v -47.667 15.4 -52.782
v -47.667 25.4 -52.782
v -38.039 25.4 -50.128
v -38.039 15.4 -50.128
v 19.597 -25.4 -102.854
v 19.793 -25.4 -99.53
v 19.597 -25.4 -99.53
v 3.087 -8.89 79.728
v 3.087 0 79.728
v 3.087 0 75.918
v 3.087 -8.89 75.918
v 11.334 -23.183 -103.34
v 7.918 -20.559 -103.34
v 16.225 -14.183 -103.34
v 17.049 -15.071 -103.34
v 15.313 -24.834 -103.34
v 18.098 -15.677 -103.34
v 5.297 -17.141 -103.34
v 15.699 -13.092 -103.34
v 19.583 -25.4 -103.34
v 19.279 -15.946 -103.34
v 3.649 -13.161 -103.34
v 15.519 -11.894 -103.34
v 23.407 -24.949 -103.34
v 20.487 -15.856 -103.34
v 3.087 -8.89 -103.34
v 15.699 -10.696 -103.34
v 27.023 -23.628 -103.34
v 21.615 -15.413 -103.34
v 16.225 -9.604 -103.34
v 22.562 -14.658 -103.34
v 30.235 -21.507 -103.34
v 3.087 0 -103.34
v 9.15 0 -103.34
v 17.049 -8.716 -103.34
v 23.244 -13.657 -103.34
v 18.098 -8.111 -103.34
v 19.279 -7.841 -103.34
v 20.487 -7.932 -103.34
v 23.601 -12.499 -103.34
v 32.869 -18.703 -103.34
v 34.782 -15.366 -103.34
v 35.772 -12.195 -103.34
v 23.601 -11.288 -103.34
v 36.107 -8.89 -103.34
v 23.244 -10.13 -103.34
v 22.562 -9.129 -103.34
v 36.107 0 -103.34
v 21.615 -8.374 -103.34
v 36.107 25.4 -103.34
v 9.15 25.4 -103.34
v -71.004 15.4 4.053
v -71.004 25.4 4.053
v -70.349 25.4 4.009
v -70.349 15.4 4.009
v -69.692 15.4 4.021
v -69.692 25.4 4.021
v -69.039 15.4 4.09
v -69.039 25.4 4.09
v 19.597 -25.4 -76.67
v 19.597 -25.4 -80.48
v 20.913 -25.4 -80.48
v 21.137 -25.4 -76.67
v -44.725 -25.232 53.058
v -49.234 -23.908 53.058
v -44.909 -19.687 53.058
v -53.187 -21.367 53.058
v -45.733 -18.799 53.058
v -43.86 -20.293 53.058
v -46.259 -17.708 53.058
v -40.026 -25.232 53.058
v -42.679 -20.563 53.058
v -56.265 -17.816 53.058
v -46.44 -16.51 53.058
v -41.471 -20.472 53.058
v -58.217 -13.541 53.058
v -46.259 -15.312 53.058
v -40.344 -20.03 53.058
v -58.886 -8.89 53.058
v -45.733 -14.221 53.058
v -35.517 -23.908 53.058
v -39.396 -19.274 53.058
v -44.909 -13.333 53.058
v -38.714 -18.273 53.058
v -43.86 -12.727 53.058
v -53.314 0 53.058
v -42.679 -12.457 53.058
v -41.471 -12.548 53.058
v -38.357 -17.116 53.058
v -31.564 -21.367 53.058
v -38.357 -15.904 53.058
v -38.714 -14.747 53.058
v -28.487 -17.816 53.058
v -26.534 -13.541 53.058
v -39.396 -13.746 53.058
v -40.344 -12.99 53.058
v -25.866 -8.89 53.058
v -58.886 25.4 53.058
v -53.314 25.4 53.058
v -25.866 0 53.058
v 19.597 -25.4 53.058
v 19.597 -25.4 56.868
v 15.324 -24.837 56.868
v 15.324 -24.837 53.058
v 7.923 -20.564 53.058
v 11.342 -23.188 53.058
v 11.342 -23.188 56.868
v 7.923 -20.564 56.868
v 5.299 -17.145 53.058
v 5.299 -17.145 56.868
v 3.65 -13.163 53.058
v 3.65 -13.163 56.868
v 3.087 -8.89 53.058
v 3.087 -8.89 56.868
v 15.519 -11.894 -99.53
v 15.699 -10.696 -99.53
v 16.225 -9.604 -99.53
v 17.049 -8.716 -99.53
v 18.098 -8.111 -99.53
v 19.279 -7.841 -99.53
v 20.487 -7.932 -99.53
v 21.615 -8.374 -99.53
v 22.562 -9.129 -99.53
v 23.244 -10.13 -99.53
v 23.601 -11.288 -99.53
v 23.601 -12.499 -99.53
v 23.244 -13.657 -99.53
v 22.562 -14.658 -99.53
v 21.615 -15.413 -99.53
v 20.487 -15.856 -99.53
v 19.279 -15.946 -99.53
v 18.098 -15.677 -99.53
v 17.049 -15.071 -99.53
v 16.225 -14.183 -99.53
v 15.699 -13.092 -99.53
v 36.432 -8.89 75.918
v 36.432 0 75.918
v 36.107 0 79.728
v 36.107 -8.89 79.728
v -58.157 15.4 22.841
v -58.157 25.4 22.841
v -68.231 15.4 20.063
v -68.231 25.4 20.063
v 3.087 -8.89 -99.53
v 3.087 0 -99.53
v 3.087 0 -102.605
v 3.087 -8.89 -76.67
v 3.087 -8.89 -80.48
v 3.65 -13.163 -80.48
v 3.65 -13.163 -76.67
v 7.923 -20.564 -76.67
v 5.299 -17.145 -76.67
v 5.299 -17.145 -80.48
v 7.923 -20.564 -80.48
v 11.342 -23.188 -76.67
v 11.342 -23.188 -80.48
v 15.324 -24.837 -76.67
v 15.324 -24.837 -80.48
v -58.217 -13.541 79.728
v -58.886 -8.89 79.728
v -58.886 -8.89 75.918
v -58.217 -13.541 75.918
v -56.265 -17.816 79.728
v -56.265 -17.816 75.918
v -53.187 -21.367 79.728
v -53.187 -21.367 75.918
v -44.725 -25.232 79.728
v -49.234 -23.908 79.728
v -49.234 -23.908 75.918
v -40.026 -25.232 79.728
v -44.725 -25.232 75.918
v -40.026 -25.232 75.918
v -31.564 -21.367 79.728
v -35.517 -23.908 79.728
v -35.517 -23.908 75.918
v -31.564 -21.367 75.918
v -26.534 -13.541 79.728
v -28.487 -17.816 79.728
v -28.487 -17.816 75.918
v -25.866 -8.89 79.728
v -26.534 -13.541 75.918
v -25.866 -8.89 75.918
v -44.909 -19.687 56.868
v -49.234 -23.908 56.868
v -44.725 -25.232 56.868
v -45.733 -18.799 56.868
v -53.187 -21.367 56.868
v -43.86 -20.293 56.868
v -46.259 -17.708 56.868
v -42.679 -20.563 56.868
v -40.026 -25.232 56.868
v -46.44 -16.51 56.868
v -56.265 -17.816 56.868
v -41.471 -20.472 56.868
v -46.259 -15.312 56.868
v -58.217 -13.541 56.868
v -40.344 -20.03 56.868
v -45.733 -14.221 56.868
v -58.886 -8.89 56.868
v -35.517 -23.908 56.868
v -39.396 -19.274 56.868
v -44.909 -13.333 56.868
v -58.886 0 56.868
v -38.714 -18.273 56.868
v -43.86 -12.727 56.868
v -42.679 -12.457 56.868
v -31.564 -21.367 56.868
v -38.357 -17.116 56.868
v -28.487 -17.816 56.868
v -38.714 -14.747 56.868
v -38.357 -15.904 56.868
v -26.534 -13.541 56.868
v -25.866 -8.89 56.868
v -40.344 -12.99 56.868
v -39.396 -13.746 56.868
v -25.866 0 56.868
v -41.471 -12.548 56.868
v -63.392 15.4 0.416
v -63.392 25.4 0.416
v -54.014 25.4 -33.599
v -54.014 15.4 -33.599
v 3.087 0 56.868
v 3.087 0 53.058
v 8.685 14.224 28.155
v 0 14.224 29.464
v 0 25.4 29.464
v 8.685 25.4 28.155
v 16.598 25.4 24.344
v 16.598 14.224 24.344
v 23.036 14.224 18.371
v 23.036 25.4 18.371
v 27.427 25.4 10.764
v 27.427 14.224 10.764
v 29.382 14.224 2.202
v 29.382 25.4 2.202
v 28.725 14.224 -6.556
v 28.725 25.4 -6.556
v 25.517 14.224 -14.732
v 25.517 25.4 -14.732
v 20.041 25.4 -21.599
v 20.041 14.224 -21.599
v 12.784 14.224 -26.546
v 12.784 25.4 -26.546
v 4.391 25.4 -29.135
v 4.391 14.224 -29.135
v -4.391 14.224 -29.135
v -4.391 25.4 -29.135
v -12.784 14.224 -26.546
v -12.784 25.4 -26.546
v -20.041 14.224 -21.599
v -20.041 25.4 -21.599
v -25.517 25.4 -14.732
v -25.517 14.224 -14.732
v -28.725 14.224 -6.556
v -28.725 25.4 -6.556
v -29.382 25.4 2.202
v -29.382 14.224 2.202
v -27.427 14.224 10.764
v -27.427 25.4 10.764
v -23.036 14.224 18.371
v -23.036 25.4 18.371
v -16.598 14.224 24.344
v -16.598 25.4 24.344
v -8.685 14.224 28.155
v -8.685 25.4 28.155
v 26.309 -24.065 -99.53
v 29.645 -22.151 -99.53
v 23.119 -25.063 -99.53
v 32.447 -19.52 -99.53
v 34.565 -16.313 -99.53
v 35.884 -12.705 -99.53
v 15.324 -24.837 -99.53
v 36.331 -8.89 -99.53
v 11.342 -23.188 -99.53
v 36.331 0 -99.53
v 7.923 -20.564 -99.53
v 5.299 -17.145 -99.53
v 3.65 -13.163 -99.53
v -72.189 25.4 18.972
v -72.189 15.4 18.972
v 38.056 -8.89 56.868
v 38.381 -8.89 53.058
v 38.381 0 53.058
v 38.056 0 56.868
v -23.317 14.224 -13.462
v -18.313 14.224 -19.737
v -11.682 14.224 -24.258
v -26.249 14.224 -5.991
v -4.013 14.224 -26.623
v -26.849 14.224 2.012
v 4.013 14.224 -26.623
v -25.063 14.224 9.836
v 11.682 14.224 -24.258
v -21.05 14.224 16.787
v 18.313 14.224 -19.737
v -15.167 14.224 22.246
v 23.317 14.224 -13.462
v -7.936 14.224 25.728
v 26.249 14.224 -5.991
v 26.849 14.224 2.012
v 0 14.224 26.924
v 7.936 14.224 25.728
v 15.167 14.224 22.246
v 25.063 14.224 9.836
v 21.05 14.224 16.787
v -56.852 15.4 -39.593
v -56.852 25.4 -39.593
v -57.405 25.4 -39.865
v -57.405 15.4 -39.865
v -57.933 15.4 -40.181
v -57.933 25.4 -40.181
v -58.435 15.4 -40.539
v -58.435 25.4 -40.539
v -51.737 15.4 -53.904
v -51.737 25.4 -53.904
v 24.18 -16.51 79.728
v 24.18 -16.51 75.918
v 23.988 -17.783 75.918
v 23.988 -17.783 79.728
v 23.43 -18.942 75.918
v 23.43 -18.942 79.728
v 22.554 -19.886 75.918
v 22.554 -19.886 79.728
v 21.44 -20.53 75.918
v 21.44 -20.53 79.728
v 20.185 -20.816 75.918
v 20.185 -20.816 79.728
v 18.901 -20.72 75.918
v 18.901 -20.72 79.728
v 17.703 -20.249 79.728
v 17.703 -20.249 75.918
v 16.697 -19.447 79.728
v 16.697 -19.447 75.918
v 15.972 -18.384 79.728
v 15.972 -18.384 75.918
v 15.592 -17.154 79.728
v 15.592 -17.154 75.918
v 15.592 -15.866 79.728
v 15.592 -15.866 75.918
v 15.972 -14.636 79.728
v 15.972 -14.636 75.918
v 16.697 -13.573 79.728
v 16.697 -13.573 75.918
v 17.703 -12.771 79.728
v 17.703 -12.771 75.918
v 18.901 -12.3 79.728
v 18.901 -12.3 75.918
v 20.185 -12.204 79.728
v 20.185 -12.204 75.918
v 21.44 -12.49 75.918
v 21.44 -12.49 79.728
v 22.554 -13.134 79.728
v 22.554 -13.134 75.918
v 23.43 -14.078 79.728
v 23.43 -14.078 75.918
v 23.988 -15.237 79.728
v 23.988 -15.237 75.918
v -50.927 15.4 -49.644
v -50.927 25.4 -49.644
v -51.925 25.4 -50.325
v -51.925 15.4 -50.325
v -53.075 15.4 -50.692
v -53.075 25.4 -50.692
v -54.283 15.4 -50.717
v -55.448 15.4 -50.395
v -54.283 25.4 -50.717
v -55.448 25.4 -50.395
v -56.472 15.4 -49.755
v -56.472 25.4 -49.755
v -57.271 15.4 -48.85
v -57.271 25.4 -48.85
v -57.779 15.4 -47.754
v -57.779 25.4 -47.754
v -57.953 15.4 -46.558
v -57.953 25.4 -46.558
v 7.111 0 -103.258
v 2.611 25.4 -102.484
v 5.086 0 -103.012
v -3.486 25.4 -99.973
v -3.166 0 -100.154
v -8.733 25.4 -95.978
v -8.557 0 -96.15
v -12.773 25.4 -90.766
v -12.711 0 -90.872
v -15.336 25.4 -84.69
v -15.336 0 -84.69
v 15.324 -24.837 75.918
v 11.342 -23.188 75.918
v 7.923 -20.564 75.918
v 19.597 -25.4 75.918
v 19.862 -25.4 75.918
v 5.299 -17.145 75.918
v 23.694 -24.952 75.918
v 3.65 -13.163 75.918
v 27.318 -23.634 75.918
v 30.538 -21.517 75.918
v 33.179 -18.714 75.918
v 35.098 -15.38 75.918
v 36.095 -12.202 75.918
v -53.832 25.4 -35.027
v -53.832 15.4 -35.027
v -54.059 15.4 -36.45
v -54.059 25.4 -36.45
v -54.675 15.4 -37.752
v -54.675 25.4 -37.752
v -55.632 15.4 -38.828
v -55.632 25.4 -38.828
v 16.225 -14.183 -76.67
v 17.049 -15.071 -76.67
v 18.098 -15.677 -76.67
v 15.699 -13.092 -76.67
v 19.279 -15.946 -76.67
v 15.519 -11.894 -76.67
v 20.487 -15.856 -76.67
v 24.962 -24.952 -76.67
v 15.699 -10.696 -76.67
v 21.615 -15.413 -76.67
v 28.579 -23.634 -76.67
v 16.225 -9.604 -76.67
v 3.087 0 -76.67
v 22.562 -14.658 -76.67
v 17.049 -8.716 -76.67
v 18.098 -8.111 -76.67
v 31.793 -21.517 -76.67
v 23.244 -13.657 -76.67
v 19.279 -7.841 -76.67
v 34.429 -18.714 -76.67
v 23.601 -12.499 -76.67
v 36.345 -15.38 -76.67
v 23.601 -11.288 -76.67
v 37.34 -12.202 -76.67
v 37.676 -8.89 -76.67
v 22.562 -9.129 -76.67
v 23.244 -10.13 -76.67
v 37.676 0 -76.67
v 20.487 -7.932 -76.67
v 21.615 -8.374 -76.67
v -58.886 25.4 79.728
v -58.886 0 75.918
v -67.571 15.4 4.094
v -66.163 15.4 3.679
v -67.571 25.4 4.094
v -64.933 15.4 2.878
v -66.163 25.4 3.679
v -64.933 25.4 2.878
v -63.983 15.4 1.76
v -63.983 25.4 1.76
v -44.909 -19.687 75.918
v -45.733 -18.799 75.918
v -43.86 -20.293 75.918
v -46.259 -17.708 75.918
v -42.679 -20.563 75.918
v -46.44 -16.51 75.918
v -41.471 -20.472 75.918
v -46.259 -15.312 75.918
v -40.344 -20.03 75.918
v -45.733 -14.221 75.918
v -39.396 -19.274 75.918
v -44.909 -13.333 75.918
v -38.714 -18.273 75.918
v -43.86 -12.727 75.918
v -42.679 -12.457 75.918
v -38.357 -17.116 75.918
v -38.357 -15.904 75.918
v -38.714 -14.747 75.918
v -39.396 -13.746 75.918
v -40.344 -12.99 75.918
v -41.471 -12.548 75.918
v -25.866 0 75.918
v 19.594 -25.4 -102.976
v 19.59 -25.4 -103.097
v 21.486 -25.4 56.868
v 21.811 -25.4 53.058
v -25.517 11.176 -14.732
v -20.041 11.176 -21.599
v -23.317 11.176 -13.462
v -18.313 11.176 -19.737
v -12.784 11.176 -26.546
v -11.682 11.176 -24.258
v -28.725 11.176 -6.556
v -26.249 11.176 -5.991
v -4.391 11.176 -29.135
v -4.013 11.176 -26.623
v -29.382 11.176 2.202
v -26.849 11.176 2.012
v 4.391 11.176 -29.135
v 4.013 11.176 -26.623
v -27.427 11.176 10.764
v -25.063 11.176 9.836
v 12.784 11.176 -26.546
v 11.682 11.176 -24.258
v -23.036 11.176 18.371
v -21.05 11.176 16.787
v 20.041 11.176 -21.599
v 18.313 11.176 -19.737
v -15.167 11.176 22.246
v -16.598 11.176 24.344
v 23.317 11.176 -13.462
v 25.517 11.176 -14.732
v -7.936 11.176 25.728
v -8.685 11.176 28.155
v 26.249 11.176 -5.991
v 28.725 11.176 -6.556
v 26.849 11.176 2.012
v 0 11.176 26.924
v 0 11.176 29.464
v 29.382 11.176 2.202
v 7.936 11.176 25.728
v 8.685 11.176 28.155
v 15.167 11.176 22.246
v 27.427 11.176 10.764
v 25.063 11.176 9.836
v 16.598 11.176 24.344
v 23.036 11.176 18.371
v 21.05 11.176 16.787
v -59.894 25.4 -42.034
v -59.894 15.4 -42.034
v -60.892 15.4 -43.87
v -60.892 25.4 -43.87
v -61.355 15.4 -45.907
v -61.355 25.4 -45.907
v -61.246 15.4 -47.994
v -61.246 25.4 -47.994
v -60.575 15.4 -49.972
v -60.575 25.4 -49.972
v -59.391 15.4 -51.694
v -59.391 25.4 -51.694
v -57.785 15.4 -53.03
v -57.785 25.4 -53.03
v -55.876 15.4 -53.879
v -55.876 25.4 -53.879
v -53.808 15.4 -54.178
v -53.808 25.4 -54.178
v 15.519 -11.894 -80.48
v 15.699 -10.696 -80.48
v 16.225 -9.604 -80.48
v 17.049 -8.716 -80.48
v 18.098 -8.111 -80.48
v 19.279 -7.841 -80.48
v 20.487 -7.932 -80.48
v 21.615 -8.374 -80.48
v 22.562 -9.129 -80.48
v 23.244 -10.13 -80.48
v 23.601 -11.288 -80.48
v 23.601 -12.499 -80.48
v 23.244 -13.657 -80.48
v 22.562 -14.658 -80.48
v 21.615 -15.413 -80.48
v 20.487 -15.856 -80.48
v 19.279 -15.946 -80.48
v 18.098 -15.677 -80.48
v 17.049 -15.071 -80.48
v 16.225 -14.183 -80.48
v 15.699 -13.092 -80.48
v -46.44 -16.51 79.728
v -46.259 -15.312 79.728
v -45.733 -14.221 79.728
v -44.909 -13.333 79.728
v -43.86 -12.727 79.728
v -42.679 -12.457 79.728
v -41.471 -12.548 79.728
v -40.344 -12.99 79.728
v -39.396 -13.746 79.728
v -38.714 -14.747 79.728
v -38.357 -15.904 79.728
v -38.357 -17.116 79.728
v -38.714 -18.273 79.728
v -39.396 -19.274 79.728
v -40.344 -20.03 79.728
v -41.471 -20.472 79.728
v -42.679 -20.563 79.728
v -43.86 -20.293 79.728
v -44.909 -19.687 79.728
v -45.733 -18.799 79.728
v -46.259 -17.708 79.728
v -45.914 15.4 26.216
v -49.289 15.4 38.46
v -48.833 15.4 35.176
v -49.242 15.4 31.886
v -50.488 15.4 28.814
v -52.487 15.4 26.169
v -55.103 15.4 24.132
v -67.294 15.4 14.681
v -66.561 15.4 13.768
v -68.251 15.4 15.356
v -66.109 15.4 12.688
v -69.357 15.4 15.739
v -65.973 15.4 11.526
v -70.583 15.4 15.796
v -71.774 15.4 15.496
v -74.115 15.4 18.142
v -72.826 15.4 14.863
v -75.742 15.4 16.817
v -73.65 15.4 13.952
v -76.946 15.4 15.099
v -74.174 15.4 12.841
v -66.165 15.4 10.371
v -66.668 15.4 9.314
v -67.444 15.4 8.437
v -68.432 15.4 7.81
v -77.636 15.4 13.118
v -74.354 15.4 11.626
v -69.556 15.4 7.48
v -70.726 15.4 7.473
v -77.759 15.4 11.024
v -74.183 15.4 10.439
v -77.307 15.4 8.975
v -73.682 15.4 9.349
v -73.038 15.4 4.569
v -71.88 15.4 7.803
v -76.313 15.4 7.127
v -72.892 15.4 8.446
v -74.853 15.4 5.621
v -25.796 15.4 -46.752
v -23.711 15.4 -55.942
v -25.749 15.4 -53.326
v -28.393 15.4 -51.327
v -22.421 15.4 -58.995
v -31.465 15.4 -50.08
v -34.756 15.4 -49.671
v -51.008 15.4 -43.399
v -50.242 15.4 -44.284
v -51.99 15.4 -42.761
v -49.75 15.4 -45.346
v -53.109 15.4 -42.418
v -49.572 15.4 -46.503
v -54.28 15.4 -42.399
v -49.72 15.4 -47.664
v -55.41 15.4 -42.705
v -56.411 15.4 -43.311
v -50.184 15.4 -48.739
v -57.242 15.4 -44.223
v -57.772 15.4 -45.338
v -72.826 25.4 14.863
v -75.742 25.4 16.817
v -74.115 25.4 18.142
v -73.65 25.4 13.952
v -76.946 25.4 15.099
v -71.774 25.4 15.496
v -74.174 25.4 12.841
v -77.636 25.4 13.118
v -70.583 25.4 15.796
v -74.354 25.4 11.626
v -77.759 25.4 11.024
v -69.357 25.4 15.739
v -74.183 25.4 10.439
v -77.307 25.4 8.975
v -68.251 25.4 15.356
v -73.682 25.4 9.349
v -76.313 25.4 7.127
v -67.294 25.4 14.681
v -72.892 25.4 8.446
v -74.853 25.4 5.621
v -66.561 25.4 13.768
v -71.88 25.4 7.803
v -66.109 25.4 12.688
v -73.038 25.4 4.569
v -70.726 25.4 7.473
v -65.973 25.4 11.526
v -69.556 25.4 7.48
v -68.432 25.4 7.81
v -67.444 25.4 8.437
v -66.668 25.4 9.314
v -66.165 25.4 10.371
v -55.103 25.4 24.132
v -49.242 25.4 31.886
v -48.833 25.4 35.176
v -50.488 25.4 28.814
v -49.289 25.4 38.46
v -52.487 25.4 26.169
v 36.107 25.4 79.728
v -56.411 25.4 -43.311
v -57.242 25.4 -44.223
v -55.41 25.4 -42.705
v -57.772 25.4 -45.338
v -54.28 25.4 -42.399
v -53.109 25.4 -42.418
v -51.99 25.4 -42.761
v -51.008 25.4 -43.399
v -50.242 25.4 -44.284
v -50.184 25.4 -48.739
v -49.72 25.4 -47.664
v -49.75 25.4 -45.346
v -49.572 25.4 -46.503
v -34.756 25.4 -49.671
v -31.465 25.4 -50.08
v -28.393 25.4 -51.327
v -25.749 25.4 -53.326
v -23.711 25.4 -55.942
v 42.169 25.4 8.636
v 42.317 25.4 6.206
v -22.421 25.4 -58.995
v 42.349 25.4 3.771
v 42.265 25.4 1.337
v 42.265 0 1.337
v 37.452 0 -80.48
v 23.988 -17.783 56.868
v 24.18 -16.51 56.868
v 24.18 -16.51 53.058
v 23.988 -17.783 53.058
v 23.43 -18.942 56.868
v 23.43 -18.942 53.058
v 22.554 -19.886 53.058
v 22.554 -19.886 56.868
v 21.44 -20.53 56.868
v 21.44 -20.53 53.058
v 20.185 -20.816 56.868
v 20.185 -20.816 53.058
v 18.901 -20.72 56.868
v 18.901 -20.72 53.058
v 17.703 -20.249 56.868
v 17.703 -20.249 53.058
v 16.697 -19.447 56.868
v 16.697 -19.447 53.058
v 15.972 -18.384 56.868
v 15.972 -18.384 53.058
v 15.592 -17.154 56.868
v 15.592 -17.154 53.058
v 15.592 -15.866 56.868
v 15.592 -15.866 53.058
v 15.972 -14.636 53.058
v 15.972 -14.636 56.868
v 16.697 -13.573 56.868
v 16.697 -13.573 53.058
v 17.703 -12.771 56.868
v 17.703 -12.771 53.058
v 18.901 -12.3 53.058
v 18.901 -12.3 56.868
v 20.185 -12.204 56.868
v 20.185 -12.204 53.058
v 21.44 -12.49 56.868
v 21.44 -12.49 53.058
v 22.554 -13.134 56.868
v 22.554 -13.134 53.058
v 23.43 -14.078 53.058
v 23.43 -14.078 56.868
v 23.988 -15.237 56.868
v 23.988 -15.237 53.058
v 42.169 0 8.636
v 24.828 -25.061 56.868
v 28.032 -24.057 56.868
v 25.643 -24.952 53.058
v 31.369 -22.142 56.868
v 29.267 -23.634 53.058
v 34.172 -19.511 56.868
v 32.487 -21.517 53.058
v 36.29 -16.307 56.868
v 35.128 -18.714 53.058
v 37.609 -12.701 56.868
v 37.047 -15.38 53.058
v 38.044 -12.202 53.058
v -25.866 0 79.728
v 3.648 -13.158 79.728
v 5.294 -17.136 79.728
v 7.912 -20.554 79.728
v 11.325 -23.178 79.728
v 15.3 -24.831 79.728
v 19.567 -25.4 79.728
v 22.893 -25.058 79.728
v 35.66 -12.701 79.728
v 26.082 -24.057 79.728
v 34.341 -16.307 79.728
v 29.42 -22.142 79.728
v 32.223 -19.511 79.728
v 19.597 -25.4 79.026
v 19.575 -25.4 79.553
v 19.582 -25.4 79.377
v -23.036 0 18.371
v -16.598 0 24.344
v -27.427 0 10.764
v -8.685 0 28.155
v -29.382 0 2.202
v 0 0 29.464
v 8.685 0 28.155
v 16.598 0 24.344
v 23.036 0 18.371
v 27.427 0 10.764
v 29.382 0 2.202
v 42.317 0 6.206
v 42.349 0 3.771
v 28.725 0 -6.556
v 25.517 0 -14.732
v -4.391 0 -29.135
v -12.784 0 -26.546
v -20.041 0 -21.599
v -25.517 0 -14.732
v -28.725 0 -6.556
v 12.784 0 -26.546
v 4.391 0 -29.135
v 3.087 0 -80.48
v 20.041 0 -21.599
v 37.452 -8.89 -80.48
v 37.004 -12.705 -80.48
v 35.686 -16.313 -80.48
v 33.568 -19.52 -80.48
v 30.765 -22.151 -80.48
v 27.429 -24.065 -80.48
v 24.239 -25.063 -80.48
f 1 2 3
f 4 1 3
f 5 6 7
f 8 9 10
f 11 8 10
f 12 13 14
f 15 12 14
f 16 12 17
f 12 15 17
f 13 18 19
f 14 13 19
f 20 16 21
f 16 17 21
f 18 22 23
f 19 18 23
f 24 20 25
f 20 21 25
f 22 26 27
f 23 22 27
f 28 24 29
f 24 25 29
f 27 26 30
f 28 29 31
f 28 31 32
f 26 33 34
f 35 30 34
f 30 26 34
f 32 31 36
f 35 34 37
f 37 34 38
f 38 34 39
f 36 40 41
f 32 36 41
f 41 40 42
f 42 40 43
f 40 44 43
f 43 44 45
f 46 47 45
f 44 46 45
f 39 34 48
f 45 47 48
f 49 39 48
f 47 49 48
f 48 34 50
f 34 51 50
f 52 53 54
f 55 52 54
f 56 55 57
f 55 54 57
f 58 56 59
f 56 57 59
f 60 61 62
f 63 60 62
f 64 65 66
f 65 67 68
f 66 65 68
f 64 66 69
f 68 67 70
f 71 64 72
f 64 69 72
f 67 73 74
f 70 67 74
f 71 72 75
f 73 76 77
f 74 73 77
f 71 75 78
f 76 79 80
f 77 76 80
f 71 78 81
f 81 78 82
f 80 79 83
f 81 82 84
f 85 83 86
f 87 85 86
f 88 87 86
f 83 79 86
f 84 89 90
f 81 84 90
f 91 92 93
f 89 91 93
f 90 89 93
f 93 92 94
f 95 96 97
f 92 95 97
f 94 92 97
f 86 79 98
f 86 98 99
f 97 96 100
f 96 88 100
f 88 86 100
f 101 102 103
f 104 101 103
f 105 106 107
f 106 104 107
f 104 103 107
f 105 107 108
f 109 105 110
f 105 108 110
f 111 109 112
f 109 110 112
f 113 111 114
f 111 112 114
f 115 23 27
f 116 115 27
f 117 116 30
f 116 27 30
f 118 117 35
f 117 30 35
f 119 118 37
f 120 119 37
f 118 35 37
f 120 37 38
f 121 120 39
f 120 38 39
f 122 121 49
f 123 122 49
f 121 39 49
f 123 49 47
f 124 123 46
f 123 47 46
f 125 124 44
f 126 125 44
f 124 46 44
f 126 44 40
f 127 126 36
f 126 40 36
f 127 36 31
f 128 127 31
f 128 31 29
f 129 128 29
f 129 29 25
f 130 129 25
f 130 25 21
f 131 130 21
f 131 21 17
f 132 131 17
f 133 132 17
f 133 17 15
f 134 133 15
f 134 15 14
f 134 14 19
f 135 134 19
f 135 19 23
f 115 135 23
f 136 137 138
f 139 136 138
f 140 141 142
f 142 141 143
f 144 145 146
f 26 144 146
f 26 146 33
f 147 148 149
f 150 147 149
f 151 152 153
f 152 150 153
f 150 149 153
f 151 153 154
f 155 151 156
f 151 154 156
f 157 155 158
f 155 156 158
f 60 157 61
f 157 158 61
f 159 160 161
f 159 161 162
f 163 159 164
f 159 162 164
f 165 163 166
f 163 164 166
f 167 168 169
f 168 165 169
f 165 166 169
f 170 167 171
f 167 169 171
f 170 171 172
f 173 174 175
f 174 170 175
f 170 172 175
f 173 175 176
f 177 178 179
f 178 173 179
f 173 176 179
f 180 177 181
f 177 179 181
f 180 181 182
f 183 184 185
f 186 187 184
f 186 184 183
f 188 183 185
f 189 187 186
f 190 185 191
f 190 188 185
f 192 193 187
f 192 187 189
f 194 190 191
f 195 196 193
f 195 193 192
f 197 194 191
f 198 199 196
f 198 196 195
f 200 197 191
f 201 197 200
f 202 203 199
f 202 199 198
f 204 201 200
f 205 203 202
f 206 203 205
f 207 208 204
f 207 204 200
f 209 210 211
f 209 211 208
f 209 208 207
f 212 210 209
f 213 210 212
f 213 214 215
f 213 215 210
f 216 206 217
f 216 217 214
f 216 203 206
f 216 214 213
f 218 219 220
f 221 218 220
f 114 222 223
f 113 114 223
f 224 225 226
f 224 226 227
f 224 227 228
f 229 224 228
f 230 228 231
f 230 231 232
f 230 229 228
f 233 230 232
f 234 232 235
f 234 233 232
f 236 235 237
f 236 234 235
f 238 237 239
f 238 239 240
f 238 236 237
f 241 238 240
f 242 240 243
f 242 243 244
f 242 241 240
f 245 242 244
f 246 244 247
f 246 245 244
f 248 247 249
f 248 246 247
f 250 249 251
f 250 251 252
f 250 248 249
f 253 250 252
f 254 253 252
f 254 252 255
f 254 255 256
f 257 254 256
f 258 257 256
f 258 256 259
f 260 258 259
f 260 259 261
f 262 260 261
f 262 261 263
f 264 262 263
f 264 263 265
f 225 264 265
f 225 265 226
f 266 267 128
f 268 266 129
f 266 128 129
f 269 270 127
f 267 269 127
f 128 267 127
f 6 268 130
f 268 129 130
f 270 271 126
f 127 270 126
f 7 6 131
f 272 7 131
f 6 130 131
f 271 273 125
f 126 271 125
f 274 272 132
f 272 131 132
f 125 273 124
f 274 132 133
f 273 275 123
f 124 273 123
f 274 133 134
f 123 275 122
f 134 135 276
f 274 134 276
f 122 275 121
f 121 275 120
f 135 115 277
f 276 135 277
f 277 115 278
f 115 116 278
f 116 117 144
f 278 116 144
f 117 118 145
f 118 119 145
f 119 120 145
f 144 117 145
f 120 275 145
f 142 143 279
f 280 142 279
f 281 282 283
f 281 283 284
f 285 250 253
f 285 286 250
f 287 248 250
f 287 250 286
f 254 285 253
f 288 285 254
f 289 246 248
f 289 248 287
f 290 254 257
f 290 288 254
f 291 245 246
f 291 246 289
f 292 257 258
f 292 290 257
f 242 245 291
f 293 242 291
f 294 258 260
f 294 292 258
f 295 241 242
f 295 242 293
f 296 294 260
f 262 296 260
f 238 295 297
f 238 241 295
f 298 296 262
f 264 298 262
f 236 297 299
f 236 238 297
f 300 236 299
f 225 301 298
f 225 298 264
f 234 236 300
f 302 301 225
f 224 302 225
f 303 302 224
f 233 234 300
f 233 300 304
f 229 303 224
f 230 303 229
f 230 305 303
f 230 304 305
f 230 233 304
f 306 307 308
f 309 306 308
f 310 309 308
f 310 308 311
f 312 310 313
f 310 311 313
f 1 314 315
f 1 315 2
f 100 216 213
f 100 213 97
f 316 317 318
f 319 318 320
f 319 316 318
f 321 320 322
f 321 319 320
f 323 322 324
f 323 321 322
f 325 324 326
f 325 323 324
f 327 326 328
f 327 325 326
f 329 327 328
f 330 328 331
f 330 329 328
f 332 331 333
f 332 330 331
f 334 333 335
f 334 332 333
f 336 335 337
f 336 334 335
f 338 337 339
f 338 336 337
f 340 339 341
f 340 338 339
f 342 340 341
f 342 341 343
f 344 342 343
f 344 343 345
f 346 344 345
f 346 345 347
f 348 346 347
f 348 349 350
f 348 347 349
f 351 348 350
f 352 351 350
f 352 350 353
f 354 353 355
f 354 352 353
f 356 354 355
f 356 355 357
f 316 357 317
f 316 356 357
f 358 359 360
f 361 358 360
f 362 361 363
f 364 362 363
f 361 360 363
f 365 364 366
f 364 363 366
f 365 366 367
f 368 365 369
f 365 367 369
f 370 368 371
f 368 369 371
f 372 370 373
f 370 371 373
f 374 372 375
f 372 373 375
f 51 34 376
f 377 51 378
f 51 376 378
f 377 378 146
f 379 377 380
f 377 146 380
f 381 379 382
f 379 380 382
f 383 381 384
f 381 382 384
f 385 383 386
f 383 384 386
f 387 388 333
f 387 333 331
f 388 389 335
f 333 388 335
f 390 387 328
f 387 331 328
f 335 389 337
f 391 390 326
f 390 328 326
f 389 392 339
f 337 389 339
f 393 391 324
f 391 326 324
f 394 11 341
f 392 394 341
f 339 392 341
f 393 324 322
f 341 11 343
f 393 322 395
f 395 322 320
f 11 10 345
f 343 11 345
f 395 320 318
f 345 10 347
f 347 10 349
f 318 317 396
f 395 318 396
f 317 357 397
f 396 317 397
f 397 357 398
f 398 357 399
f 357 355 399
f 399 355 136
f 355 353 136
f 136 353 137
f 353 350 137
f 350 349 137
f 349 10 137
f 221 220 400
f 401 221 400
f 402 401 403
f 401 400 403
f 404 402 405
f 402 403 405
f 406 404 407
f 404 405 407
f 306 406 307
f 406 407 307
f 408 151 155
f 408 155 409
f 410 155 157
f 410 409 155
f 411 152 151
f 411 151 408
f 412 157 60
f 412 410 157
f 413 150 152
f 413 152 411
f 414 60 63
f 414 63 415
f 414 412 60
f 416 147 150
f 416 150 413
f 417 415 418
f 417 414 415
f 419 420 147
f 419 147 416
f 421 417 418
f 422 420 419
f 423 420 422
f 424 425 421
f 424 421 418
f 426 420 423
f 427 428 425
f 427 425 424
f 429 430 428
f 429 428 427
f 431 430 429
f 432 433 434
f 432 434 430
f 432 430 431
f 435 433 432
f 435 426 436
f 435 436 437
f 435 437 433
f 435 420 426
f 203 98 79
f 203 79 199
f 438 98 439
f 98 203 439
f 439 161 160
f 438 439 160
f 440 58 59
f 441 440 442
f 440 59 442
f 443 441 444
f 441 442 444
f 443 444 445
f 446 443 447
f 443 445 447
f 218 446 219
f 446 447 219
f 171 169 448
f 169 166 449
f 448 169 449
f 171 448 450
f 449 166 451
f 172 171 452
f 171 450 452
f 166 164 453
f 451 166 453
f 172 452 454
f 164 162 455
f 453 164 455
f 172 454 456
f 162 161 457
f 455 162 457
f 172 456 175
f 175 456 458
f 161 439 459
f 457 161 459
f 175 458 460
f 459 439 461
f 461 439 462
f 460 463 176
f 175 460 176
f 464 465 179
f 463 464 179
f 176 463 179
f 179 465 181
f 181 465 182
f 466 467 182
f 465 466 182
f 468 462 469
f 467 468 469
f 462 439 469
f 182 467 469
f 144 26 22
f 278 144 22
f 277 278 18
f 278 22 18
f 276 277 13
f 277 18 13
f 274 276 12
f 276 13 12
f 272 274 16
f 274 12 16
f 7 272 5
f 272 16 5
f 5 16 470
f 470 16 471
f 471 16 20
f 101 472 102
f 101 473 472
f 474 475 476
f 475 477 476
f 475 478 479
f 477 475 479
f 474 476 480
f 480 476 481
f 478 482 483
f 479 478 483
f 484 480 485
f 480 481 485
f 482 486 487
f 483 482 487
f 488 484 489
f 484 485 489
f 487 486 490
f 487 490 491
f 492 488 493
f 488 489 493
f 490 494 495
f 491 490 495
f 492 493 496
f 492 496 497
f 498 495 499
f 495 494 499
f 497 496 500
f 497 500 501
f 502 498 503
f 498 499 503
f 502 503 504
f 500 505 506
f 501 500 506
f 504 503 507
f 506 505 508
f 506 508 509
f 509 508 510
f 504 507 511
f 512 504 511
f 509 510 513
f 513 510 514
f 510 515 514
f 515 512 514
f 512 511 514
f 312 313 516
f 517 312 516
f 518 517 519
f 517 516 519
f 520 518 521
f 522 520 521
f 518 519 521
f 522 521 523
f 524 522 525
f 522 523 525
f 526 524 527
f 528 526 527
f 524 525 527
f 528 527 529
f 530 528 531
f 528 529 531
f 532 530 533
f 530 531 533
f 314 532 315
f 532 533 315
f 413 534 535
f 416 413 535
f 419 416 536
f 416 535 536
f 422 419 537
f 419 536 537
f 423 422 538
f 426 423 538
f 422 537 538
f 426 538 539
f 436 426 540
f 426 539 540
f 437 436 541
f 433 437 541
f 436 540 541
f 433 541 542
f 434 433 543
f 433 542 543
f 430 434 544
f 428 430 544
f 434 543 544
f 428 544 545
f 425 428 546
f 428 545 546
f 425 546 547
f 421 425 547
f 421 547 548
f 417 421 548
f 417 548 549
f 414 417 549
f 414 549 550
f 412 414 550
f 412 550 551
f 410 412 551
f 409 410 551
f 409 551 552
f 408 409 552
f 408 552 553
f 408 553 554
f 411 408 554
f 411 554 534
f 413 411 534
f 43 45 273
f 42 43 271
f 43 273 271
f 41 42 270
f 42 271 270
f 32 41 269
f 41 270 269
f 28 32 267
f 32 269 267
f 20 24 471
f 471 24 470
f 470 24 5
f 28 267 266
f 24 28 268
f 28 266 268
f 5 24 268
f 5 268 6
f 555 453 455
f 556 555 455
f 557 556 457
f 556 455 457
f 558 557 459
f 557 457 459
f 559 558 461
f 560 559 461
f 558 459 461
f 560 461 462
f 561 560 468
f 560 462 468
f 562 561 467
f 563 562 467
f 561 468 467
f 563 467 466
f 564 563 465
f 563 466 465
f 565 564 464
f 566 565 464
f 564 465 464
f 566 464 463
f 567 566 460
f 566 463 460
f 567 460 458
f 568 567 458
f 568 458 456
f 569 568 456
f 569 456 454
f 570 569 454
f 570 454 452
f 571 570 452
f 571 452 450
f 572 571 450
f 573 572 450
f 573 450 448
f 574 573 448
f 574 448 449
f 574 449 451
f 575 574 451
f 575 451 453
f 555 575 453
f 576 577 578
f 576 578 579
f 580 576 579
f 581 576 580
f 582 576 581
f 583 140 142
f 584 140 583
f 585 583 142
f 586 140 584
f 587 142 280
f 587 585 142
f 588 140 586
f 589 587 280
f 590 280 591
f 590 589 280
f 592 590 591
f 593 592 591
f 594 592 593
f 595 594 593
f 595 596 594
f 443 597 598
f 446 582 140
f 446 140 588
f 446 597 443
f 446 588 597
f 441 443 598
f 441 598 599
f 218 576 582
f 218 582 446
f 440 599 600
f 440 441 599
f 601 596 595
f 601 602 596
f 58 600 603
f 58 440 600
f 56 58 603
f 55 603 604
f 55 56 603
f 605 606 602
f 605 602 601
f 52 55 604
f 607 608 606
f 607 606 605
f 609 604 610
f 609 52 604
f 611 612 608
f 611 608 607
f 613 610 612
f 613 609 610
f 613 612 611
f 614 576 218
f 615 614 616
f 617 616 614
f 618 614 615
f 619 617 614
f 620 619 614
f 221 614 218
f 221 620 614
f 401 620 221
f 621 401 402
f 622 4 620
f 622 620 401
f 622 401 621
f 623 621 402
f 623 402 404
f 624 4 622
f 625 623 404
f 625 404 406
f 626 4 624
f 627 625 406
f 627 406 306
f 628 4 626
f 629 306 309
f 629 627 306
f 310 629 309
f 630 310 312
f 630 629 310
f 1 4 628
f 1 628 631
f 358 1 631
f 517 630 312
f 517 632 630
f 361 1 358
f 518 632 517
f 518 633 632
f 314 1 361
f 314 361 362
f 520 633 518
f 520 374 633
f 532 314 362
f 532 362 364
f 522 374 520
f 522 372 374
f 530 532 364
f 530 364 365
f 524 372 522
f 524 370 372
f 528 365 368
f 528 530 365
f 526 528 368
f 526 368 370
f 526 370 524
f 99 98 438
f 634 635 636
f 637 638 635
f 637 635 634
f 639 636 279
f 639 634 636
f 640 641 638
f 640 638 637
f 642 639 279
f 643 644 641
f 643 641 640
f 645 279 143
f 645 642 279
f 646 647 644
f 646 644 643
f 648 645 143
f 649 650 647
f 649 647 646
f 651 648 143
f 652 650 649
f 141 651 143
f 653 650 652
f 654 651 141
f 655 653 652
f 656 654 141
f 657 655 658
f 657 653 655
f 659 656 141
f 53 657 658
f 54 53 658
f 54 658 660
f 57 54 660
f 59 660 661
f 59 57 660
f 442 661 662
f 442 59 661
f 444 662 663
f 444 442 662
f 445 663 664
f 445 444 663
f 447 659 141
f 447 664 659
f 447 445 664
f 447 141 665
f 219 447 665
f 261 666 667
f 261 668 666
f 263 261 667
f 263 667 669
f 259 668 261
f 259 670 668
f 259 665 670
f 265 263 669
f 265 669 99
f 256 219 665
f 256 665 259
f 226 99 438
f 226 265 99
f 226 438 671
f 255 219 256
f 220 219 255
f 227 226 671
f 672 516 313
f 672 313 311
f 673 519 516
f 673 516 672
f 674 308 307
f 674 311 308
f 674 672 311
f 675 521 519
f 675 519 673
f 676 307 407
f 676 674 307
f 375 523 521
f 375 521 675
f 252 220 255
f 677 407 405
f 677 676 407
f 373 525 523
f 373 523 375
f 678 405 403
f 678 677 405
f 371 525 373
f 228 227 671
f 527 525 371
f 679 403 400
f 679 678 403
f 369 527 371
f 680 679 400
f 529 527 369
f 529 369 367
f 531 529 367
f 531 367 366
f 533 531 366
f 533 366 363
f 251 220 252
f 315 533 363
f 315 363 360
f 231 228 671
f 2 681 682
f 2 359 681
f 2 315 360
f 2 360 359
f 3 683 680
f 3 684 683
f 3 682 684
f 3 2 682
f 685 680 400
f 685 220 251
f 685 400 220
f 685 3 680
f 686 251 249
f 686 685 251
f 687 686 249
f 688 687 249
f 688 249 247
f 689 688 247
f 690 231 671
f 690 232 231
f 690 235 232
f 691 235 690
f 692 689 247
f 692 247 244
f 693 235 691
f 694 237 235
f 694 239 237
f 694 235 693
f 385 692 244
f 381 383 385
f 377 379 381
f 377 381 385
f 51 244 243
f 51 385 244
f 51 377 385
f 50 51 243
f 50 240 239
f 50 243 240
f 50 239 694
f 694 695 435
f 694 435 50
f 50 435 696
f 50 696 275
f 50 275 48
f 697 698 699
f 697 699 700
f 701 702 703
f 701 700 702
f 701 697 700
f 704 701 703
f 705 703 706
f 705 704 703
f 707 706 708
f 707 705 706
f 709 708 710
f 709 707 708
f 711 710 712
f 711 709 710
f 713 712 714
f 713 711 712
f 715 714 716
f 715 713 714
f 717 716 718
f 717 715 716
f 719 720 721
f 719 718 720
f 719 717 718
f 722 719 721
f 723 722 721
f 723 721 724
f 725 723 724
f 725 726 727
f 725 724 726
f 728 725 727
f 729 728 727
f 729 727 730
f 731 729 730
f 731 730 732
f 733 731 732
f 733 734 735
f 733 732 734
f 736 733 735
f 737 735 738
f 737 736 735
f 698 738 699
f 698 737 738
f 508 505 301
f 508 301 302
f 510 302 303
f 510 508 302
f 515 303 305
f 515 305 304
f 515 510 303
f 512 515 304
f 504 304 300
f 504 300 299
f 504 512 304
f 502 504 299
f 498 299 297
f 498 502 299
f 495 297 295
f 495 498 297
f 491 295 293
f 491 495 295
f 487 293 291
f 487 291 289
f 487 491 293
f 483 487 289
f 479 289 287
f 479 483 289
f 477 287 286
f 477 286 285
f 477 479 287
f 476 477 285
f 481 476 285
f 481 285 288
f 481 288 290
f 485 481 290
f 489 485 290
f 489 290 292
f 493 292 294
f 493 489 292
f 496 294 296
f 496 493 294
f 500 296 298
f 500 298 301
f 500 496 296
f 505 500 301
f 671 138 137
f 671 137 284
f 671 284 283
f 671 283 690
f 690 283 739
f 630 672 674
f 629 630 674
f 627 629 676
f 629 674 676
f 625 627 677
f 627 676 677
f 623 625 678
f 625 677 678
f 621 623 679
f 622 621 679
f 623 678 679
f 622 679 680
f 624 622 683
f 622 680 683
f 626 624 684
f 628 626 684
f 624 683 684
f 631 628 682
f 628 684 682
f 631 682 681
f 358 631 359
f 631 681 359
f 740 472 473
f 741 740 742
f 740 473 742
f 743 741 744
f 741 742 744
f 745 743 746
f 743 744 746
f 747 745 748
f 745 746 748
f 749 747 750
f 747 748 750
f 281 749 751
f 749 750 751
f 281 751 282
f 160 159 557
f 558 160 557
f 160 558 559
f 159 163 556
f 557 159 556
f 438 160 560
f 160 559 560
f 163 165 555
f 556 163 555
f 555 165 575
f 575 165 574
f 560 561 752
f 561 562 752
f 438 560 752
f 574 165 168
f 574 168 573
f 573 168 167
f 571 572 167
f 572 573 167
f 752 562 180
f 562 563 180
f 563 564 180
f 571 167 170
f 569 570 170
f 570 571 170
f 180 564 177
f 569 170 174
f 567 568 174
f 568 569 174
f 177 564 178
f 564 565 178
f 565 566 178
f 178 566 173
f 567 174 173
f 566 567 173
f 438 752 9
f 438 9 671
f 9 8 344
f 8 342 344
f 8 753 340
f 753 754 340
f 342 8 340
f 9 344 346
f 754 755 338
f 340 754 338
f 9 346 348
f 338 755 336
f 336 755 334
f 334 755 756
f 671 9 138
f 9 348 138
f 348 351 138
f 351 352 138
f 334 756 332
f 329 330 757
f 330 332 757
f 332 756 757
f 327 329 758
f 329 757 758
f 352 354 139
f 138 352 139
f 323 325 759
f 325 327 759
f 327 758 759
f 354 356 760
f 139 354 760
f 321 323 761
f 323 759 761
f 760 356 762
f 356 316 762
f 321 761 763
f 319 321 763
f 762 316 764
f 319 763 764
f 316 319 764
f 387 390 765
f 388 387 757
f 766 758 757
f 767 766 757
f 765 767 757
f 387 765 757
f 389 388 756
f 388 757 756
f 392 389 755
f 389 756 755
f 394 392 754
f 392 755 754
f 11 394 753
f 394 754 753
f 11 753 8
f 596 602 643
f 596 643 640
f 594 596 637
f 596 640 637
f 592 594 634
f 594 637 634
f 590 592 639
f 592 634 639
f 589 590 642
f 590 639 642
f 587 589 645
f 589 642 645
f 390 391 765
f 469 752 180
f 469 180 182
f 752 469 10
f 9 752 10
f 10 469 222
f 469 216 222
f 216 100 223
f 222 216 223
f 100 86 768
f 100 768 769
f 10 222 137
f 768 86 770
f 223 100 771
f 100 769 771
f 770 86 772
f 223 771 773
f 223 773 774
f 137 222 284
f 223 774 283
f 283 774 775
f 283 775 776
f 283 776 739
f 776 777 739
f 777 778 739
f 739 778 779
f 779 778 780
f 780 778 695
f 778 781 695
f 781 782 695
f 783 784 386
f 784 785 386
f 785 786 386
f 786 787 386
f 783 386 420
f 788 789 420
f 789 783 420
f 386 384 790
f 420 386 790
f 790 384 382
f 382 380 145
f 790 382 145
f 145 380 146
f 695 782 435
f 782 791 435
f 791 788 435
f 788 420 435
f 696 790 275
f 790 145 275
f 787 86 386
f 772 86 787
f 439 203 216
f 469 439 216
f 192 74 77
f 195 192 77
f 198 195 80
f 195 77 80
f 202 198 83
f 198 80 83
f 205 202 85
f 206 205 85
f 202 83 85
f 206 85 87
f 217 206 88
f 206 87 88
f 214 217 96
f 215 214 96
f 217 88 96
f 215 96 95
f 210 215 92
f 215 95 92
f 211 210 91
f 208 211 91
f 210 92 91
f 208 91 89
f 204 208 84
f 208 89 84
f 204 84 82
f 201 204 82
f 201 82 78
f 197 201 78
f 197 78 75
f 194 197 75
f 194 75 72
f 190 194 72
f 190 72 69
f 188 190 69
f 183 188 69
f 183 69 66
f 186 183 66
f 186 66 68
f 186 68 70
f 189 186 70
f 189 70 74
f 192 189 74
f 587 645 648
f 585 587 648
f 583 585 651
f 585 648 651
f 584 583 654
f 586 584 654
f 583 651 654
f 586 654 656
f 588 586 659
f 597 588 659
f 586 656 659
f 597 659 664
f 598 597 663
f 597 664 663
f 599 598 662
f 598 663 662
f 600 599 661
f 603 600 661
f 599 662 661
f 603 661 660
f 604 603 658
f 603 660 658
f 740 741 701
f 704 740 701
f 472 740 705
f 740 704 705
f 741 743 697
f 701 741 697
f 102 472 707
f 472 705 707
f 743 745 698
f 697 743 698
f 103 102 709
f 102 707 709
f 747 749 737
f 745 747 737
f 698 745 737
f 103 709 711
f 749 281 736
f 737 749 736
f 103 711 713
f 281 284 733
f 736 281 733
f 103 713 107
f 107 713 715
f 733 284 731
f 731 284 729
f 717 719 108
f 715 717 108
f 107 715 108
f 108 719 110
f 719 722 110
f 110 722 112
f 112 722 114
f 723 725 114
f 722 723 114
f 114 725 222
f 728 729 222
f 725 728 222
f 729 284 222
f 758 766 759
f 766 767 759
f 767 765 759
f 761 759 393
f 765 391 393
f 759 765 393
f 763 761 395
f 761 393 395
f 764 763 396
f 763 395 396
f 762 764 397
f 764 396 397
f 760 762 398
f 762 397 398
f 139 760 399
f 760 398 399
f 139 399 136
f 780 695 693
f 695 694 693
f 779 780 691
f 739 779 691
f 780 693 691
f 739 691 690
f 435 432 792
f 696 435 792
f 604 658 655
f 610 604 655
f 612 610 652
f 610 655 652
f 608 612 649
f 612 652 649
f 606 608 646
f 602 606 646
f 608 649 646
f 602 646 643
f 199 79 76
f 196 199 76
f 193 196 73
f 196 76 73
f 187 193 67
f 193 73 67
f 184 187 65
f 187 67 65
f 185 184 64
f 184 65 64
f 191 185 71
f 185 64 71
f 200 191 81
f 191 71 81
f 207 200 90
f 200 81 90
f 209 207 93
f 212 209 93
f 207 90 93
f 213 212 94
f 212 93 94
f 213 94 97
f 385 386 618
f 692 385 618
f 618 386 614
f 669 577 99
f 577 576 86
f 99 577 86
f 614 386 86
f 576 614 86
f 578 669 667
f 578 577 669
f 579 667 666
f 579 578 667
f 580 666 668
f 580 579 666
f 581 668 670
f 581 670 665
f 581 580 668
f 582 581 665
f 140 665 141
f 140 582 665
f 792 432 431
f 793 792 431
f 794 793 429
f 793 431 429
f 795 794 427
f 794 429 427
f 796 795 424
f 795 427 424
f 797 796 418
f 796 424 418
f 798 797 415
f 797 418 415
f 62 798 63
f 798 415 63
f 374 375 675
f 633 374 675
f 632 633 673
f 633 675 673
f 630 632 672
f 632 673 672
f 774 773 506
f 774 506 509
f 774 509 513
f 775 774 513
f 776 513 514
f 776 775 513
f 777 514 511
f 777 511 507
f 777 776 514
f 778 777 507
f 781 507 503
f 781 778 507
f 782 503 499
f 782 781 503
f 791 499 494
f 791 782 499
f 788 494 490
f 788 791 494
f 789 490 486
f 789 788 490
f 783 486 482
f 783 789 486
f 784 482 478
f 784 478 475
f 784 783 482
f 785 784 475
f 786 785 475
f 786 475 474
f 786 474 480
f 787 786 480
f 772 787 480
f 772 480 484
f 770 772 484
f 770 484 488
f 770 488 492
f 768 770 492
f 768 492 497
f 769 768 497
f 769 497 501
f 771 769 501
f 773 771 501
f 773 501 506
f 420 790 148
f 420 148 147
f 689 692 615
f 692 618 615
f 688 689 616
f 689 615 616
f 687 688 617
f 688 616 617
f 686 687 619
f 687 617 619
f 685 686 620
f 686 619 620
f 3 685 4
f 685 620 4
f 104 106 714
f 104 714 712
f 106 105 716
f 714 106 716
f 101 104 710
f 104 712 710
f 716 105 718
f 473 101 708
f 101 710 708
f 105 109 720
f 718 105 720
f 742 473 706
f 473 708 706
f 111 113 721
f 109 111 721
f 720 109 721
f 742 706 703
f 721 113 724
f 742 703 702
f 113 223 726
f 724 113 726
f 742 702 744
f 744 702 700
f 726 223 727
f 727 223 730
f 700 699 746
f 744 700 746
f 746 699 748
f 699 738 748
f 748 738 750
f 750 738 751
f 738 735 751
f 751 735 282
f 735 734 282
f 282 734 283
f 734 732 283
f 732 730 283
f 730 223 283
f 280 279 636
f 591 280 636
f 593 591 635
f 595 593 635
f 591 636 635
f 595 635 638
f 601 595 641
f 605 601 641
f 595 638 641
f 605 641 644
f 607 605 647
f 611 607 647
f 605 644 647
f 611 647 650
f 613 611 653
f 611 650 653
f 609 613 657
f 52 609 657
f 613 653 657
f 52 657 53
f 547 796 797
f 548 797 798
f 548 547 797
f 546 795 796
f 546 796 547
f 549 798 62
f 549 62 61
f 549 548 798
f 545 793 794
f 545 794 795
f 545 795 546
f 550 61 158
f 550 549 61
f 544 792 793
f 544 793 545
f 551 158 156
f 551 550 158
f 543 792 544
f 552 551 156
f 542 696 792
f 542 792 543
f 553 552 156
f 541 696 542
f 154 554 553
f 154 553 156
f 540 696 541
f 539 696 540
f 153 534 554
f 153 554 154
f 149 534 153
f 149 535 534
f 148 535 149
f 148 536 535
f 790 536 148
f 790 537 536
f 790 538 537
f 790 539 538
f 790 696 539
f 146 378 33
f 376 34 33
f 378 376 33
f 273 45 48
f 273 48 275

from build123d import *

# Parameters (mm, degrees)
SKETCH1_R                      = 29.464
BASE_DEPTH                     = 25.4
SKETCH2_W                      = 33.02
SKETCH2_H                      = 3.81
A_ARMS_DEPTH                   = 25.4
FILLET_A_ARM_TAB_F_R           = 16.51
FILLET2_R                      = 50.8
BOSS_EXTRUDE3_DEPTH            = 10
FILLET3_R                      = 12.7
SKETCH6_R                      = 4.064
TAB_HOLES_1_DEPTH              = 38.1
SKETCH7_R                      = 4.064
TAB_HOLES_2_DEPTH              = 177.509801452
MID_FEATURE_BEARING_DEPTH      = 1.524
MID_FEATURE_BEARING_DEPTH_BACK = 1.524
SKETCH8_R                      = 29.464
SKETCH8_R_2                    = 26.924
SKETCH11_R                     = 4.318
TAB_HOLES_3_DEPTH              = 50.8


with BuildPart() as part:
    # Sketch1 → Base (new body)
    with BuildSketch(Plane(origin=(0, 0, 0), x_dir=(1, 0, 0), z_dir=(0, 1, 0))):
        with BuildLine():
            Line((-58.88559997, -79.728413598), (36.107103946, -79.728413598))
            Line((36.107103946, -79.728413598), (42.479503863, -4.99030836))
            Line((42.479503863, -4.99030836), (36.107103946, 103.339537331))
            Line((36.107103946, 103.339537331), (9.149946216, 103.339537331))
            ThreePointArc((9.149946216, 103.339537331), (-6.239768533, 98.146384684), (-15.336480298, 84.690457011))
            Line((-15.336480298, 84.690457011), (-53.313910816, -53.058413598))
            Line((-53.313910816, -53.058413598), (-58.88559997, -53.058413598))
            Line((-58.88559997, -53.058413598), (-58.88559997, -79.728413598))
        make_face()
        with Locations(Location((0, 0, 0), (0, 0, 270))):
            Circle(SKETCH1_R, mode=Mode.SUBTRACT)
    extrude(amount=BASE_DEPTH)

    # Sketch2 → A-Arms (add)
    with BuildSketch(Plane(origin=(0, 0, 0), x_dir=(1, 0, 0), z_dir=(0, 1, 0))):
        Polygon((36.107103946, 103.339537331), (36.331223565, 99.529537331), (3.087103946, 99.529537331), (3.087103946, 103.339537331), align=None)
        Polygon((3.087103946, -75.918413598), (36.431956223, -75.918413598), (36.107103946, -79.728413598), (3.087103946, -79.728413598), align=None)
        Polygon((3.087103946, 80.479537331), (3.087103946, 76.669537331), (37.675941275, 76.669537331), (37.451821657, 80.479537331), align=None)
        Polygon((3.087103946, -53.058413598), (38.381069887, -53.058413598), (38.056217609, -56.868413598), (3.087103946, -56.868413598), align=None)
        with Locations((-42.37559997, -54.963413598)):
            Rectangle(SKETCH2_W, SKETCH2_H)
        with Locations((-42.37559997, -77.823413598)):
            Rectangle(SKETCH2_W, SKETCH2_H)
    extrude(amount=-A_ARMS_DEPTH)

    # Fillet a-arm tab f
    # the kernel refuses this fillet: 16.51 mm, written as the material it takes off along each edge
    with BuildSketch(Plane(origin=(39.93846651, -25.4, 34.792630802), x_dir=(-0.9963848042708363, 0, -0.08495482221844149), z_dir=(-0.08495482221844149, 0, 0.9963848042708364)), Plane(origin=(41.887580174, -25.4, 11.932630802), x_dir=(-0.9963848042708365, 0, -0.08495482221843932), z_dir=(-0.08495482221843934, 0, 0.9963848042708366))) as fillet_a_arm_tab_f_piece_1:
        with BuildLine():
            CenterArc((FILLET_A_ARM_TAB_F_R, -FILLET_A_ARM_TAB_F_R), FILLET_A_ARM_TAB_F_R, 90, 90)
            Line((0, -FILLET_A_ARM_TAB_F_R), (0, 0))
            Line((0, 0), (FILLET_A_ARM_TAB_F_R, 0))
        make_face()
    extrude(amount=86.373823872, mode=Mode.SUBTRACT)
    with BuildSketch(Plane(origin=(3.087103946, -25.4, 121.003413598), x_dir=(0, 1, 0), z_dir=(0, 0, -1)), Plane(origin=(3.087103946, -25.4, -121.754537331), x_dir=(1, 0, 0), z_dir=(0, 0, 1)), Plane(origin=(-25.86559997, -25.4, 98.143413598), x_dir=(-1, 0, 0), z_dir=(0, 0, -1)), Plane(origin=(-58.88559997, -25.4, 11.783413598), x_dir=(1, 0, 0), z_dir=(0, 0, 1))) as fillet_a_arm_tab_f_piece_2:
        with BuildLine():
            CenterArc((FILLET_A_ARM_TAB_F_R, FILLET_A_ARM_TAB_F_R), FILLET_A_ARM_TAB_F_R, 180, 90)
            Line((0, FILLET_A_ARM_TAB_F_R), (0, 0))
            Line((0, 0), (FILLET_A_ARM_TAB_F_R, 0))
        make_face()
    extrude(amount=86.36, mode=Mode.SUBTRACT)
    with BuildSketch(Plane(origin=(3.087103946, -25.4, 98.143413598), x_dir=(1, 0, 0), z_dir=(0, 0, -1)), Plane(origin=(3.087103946, -25.4, -58.254537331), x_dir=(1, 0, 0), z_dir=(0, 0, -1)), Plane(origin=(-58.88559997, -25.4, 121.003413598), x_dir=(1, 0, 0), z_dir=(0, 0, -1)), Plane(origin=(-25.86559997, -25.4, 34.643413598), x_dir=(-1, 0, 0), z_dir=(0, 0, 1))) as fillet_a_arm_tab_f_piece_3:
        with BuildLine():
            CenterArc((FILLET_A_ARM_TAB_F_R, -FILLET_A_ARM_TAB_F_R), FILLET_A_ARM_TAB_F_R, 90, 90)
            Line((0, -FILLET_A_ARM_TAB_F_R), (0, 0))
            Line((0, 0), (FILLET_A_ARM_TAB_F_R, 0))
        make_face()
    extrude(amount=86.36, mode=Mode.SUBTRACT)
    with BuildSketch(Plane(origin=(40.099713977, -25.4, -35.465763828), x_dir=(-0.9982743428955775, 0, 0.05872253669931843), z_dir=(-0.05872253669931843, 0, -0.9982743428955776)), Plane(origin=(33.683331244, -25.4, -144.543310834), x_dir=(0, 1, 0), z_dir=(0.05872253669931843, 0, 0.9982743428955776))) as fillet_a_arm_tab_f_piece_4:
        with BuildLine():
            CenterArc((FILLET_A_ARM_TAB_F_R, FILLET_A_ARM_TAB_F_R), FILLET_A_ARM_TAB_F_R, 180, 90)
            Line((0, FILLET_A_ARM_TAB_F_R), (0, 0))
            Line((0, 0), (FILLET_A_ARM_TAB_F_R, 0))
        make_face()
    extrude(amount=86.366586119, mode=Mode.SUBTRACT)

    # Fillet2
    fillet2_edges = [part.edges().sort_by_distance(p)[0] for p in [
        (42.479503863, 12.7, 4.99030836),
    ]]
    fillet(fillet2_edges, radius=FILLET2_R)

    # Sketch3 → Boss-Extrude3 (add)
    with BuildSketch(Plane(origin=(0, 25.4, 0), x_dir=(-1, 0, 0), z_dir=(0, -1, 0))):
        with BuildLine():
            Line((47.666796836, 52.78191811), (25.796089041, 46.75215335))
            Line((25.796089041, 46.75215335), (45.913565896, -26.216440853))
            Line((45.913565896, -26.216440853), (68.231322711, -20.063424462))
            ThreePointArc((68.231322711, -20.063424462), (68.827916005, -17.910119441), (69.356571433, -15.739135906))
            ThreePointArc((69.356571433, -15.739135906), (66.028611601, -10.941366051), (70.726242467, -7.473488245))
            ThreePointArc((70.726242467, -7.473488245), (70.885962372, -5.764957818), (71.004415449, -4.053071275))
            ThreePointArc((71.004415449, -4.053071275), (70.020531637, -4.0078353), (69.039031874, -4.089883254))
            ThreePointArc((69.039031874, -4.089883254), (65.518990894, -3.323443269), (63.392280792, -0.415656673))
            Line((63.392280792, -0.415656673), (54.014483076, 33.598783658))
            ThreePointArc((54.014483076, 33.598783658), (54.320283062, 37.122596493), (56.852004495, 39.592648541))
            ThreePointArc((56.852004495, 39.592648541), (57.672230058, 40.01773376), (58.434985849, 40.538954462))
            ThreePointArc((58.434985849, 40.538954462), (57.439925969, 41.936968234), (56.41142698, 43.310568065))
            ThreePointArc((56.41142698, 43.310568065), (50.594219677, 43.814563519), (50.926596454, 49.644095052))
            ThreePointArc((50.926596454, 49.644095052), (49.321656334, 51.238936528), (47.666796836, 52.78191811))
        make_face()
        with BuildLine():
            Line((51.737082765, 53.904097917), (47.666796836, 52.78191811))
            ThreePointArc((47.666796836, 52.78191811), (49.321656334, 51.238936528), (50.926596454, 49.644095052))
            ThreePointArc((50.926596454, 49.644095052), (55.447559185, 50.395432037), (57.95335867, 46.558169963))
            ThreePointArc((57.95335867, 46.558169963), (57.548301504, 44.760638918), (56.41142698, 43.310568065))
            ThreePointArc((56.41142698, 43.310568065), (57.439925969, 41.936968234), (58.434985849, 40.538954462))
            ThreePointArc((58.434985849, 40.538954462), (60.574765152, 49.972187818), (51.737082765, 53.904097917))
        make_face()
        with BuildLine():
            ThreePointArc((69.356571433, -15.739135906), (68.827916005, -17.910119441), (68.231322711, -20.063424462))
            Line((68.231322711, -20.063424462), (72.188506448, -18.972426984))
            ThreePointArc((72.188506448, -18.972426984), (77.759344227, -11.023625151), (71.004415449, -4.053071275))
            ThreePointArc((71.004415449, -4.053071275), (70.885962372, -5.764957818), (70.726242467, -7.473488245))
            ThreePointArc((70.726242467, -7.473488245), (73.319499224, -8.869245139), (74.354230544, -11.62649903))
            ThreePointArc((74.354230544, -11.62649903), (72.826290125, -14.862637881), (69.356571433, -15.739135906))
        make_face()
    extrude(amount=BOSS_EXTRUDE3_DEPTH)

    # Fillet3
    fillet3_edges = [part.edges().sort_by_distance(p)[0] for p in [
        (-25.796089041, 20.4, -46.75215335),
        (-45.913565896, 20.4, 26.216440853),
    ]]
    fillet(fillet3_edges, radius=FILLET3_R)

    # Sketch6 → Tab Holes 1 (cut)
    with BuildSketch(Plane(origin=(0, 0, -103.339537331), x_dir=(-1, 0, 0), z_dir=(0, 0, -1))):
        with Locations((-19.582846345, -11.893705932)):
            Circle(SKETCH6_R)
    extrude(amount=-TAB_HOLES_1_DEPTH, mode=Mode.SUBTRACT)

    # Sketch7 → Tab Holes 2 (cut, through all)
    with BuildSketch(Plane(origin=(0, 0, 53.058413598), x_dir=(-1, 0, 0), z_dir=(0, 0, -1))):
        with Locations((42.37559997, -16.51)):
            Circle(SKETCH7_R)
    extrude(amount=-TAB_HOLES_2_DEPTH, mode=Mode.SUBTRACT)

    # Sketch8 → mid-feature bearing (add, two sides: drawn at the far end of the back side and taken through both)
    with BuildSketch(Plane(origin=(0, 12.7, 0), x_dir=(1, 0, 0), z_dir=(0, 1, 0)).offset(-MID_FEATURE_BEARING_DEPTH_BACK)):
        with Locations(Location((0, 0, 0), (0, 0, 270))):
            Circle(SKETCH8_R)
        with Locations(Location((0, 0, 0), (0, 0, 270))):
            Circle(SKETCH8_R_2, mode=Mode.SUBTRACT)
    extrude(amount=MID_FEATURE_BEARING_DEPTH + MID_FEATURE_BEARING_DEPTH_BACK)

    # Sketch11 → Tab Holes 3 (cut)
    with BuildSketch(Plane(origin=(0, 0, 79.728413598), x_dir=(-1, 0, 0), z_dir=(0, 0, -1))):
        with Locations(Location((-19.862052779, -16.51, 0), (0, 0, 180))):
            Circle(SKETCH11_R)
    extrude(amount=TAB_HOLES_3_DEPTH, mode=Mode.SUBTRACT)


solid = part.part
